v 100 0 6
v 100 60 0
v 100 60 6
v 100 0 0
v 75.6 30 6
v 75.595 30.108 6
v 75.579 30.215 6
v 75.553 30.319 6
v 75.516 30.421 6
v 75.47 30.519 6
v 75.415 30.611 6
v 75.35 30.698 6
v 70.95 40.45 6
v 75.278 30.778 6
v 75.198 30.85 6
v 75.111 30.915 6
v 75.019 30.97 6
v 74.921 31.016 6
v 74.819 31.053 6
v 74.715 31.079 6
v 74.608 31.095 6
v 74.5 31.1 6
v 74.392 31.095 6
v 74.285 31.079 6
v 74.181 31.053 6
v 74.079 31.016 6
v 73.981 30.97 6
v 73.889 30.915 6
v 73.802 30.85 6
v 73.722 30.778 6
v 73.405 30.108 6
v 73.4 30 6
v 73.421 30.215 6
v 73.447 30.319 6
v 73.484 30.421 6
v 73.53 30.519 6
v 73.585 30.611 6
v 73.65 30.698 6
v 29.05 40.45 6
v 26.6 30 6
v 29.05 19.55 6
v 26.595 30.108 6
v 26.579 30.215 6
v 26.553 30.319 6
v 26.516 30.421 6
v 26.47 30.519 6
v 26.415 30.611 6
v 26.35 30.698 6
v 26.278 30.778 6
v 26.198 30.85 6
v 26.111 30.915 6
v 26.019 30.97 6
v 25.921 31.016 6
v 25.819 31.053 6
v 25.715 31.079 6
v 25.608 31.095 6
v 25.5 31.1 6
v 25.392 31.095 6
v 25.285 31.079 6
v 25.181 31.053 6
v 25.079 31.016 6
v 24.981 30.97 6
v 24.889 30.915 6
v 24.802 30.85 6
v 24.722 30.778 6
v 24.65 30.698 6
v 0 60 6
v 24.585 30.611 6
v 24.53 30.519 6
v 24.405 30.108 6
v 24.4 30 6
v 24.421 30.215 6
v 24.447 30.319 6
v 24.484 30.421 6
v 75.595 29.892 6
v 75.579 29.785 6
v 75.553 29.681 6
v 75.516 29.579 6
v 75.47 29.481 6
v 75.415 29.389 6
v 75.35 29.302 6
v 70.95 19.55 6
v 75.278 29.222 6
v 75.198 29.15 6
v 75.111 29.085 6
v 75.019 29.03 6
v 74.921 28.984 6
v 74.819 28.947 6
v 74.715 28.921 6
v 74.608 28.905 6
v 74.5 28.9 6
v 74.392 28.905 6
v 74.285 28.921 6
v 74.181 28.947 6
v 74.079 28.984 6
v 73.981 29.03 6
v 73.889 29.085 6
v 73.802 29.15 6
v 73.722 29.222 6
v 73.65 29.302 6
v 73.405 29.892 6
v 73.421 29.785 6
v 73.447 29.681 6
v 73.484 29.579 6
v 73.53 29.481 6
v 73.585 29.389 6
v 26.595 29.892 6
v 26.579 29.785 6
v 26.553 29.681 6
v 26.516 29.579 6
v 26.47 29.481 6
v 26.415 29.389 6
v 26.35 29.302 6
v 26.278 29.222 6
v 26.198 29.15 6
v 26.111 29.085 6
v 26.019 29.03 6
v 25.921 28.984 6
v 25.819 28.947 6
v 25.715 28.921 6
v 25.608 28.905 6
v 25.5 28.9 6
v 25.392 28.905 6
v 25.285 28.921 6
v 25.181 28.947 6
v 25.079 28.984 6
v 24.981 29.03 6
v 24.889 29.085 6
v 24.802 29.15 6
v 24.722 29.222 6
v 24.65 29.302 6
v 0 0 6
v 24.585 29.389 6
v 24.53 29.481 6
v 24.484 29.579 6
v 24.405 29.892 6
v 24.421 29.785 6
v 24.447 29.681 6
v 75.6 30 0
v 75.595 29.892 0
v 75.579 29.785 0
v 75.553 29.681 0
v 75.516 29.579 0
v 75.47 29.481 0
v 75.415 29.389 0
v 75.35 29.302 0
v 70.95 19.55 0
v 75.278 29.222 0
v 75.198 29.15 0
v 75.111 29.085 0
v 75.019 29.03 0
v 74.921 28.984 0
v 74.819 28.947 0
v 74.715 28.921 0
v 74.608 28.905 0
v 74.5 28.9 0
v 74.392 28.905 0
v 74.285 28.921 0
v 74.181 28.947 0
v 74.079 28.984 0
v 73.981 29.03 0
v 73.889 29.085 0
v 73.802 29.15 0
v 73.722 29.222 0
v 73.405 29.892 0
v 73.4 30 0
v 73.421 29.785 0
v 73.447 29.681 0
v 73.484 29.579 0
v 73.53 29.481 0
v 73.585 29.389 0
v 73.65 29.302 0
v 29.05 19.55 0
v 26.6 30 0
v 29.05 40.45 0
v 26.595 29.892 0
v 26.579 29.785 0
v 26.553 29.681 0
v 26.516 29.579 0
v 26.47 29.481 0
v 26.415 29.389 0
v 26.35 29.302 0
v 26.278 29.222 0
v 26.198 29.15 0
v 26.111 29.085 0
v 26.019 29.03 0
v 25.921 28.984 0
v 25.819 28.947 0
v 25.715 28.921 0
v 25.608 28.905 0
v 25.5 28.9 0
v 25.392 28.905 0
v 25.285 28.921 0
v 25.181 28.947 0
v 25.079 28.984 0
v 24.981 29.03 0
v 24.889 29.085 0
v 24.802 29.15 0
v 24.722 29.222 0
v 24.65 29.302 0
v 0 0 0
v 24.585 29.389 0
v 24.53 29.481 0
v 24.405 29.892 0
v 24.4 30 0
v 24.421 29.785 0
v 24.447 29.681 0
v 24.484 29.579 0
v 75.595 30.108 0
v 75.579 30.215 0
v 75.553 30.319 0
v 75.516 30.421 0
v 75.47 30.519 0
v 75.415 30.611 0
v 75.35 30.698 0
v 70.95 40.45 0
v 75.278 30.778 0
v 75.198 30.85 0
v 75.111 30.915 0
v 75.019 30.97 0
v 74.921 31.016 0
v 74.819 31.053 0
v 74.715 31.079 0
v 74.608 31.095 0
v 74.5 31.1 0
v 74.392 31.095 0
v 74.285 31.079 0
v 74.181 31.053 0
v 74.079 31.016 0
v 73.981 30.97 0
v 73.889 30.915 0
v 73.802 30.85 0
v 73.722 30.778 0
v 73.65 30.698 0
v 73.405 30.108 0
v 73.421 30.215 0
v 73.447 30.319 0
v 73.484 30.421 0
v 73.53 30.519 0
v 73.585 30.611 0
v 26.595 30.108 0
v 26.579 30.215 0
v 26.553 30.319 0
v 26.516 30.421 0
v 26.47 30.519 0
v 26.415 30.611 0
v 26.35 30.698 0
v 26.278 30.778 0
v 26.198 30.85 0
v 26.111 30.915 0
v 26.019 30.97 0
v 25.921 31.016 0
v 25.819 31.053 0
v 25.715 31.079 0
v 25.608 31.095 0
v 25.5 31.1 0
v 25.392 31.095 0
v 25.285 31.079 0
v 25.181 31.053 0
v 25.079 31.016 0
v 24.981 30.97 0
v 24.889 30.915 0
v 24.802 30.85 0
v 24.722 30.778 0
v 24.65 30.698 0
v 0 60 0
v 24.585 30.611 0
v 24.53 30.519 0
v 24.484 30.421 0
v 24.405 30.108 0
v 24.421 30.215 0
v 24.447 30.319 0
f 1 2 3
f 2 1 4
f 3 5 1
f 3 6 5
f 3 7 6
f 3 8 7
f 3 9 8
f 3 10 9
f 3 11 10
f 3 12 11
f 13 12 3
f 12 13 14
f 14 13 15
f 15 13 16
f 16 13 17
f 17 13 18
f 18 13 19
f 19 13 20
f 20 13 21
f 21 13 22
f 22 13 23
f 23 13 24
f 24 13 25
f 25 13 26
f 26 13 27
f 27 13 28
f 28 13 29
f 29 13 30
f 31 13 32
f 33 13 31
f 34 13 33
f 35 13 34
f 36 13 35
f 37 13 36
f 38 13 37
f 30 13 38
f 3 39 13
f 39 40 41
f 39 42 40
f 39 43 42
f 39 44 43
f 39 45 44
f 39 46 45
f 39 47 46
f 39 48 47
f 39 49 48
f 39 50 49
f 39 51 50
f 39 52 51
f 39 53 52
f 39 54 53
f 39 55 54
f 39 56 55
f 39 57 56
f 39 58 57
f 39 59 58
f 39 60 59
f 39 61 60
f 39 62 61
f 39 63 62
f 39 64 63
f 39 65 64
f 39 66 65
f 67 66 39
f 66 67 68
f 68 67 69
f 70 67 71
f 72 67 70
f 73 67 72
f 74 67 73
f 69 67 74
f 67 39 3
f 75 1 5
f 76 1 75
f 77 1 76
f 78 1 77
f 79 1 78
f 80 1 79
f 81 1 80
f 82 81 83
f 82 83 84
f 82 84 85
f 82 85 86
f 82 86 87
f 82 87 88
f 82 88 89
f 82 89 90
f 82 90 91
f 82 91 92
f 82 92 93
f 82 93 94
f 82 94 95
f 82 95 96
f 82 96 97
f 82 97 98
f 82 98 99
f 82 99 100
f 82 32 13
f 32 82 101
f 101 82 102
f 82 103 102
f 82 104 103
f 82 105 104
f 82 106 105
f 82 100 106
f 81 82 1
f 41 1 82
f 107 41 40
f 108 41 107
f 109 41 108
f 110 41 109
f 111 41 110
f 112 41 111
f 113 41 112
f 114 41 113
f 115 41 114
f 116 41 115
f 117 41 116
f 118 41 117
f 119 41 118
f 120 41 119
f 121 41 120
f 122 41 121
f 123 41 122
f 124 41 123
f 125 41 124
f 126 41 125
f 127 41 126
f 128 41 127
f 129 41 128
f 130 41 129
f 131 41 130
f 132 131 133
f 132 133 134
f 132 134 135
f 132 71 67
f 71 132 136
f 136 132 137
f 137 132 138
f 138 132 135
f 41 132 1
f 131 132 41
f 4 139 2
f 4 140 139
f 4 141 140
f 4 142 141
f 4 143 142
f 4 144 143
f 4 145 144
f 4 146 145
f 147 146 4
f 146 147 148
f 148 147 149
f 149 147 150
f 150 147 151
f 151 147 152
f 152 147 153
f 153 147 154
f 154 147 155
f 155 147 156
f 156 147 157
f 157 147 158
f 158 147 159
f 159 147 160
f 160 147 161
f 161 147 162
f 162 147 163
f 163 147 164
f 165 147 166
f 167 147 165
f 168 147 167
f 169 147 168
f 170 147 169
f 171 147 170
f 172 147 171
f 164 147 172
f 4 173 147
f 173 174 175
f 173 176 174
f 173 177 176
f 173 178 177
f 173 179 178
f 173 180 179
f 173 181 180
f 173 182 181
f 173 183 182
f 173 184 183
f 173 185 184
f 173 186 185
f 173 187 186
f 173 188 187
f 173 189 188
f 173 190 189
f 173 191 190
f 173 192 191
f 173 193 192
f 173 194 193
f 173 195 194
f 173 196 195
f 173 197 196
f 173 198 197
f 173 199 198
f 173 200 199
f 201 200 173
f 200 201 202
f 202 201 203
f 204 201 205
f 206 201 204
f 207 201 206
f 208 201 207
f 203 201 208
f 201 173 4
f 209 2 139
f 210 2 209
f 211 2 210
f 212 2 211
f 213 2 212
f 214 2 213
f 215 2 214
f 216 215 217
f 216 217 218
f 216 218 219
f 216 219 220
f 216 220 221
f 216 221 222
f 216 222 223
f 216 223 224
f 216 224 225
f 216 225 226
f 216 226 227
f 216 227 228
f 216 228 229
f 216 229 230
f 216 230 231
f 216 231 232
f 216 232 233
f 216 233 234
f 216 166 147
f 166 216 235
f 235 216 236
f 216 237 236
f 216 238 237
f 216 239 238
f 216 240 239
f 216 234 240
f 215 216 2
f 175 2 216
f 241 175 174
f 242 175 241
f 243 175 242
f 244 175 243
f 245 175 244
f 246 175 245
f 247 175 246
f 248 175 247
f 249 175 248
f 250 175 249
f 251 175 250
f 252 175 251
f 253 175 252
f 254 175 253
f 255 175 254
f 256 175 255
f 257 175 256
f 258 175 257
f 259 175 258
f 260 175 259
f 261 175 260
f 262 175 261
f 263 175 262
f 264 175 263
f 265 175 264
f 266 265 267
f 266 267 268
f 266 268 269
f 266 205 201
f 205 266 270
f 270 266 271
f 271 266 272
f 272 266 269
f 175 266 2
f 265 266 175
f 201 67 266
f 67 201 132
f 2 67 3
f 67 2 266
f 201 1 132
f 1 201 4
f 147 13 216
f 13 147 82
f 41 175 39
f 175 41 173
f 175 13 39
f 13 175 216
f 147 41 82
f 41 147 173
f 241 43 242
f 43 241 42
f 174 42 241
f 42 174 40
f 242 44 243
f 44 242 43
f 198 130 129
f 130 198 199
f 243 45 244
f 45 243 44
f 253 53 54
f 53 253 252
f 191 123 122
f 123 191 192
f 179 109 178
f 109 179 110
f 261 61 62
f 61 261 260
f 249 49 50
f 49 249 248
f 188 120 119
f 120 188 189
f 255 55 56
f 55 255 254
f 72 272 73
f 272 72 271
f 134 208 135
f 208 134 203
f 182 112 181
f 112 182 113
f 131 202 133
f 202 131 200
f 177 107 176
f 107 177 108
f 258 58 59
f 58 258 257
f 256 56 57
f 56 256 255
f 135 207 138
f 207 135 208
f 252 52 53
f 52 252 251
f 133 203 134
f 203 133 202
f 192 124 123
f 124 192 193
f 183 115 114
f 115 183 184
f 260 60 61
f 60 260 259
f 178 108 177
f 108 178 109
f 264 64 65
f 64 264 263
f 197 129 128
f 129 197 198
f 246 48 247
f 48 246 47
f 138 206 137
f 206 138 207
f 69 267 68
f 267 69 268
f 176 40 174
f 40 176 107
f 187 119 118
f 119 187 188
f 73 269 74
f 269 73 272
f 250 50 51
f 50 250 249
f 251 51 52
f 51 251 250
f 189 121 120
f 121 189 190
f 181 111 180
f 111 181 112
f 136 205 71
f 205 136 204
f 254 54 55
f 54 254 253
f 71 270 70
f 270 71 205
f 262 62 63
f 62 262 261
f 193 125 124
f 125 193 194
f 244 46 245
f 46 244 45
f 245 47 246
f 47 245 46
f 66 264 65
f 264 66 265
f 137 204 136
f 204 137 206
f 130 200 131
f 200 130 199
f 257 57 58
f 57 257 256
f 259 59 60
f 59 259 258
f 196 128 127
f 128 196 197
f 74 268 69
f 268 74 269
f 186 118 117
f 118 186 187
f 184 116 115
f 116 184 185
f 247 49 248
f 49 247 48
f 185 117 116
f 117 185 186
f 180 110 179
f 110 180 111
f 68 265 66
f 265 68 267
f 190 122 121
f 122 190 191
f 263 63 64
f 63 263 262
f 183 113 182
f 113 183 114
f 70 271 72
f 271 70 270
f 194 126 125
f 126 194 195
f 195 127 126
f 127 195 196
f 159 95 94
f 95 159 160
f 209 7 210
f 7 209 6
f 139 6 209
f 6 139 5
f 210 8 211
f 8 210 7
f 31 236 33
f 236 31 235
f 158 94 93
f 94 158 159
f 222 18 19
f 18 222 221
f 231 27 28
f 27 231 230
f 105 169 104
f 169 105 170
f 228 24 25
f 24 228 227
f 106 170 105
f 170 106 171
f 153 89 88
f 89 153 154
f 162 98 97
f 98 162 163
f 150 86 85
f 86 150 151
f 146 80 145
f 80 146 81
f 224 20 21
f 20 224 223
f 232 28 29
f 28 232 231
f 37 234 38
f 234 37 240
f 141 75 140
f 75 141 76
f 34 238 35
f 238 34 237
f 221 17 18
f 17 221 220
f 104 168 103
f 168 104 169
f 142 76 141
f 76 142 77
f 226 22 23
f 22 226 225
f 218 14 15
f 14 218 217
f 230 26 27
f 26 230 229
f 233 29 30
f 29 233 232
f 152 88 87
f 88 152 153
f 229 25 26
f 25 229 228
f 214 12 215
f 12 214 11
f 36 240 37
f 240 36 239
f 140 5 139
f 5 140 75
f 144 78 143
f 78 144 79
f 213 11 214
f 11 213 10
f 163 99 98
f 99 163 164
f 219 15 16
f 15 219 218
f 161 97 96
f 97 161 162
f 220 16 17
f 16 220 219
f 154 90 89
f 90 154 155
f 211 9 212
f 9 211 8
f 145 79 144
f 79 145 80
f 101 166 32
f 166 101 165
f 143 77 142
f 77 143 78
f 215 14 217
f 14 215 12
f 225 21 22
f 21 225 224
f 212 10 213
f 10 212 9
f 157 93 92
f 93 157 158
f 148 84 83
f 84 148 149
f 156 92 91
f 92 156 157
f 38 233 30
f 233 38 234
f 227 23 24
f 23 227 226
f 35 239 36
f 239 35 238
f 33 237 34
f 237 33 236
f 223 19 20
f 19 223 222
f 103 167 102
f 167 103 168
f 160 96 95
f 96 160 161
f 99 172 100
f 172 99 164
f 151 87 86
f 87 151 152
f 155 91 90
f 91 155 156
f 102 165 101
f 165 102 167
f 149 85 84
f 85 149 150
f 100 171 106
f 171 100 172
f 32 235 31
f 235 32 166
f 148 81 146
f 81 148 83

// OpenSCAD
// Auto-generated by Mecha-Splicer
// servo_mount=bench_mix_2_hip_mount servo=mg996r

$fn = 64;

module servo_mount() {
  plate_w = 100.0; plate_h = 60.0; plate_t = 6.0;
  clearance = 0.6; hole_d = 2.2;
  body_w = 40.7; body_h = 19.7; flange_w = 54.0; flange_h = 19.7;
  hole_spacing_x = 49.0;
  difference() {
    cube([plate_w, plate_h, plate_t], center=false);
    translate([(plate_w-body_w-clearance*2)/2, (plate_h-body_h-clearance*2)/2, -1])
      cube([body_w+clearance*2, body_h+clearance*2, plate_t+2], center=false);
    translate([plate_w/2 - hole_spacing_x/2, plate_h/2, -1]) cylinder(h=plate_t+2, d=hole_d, center=false);
    translate([plate_w/2 + hole_spacing_x/2, plate_h/2, -1]) cylinder(h=plate_t+2, d=hole_d, center=false);
  }
}
servo_mount();
